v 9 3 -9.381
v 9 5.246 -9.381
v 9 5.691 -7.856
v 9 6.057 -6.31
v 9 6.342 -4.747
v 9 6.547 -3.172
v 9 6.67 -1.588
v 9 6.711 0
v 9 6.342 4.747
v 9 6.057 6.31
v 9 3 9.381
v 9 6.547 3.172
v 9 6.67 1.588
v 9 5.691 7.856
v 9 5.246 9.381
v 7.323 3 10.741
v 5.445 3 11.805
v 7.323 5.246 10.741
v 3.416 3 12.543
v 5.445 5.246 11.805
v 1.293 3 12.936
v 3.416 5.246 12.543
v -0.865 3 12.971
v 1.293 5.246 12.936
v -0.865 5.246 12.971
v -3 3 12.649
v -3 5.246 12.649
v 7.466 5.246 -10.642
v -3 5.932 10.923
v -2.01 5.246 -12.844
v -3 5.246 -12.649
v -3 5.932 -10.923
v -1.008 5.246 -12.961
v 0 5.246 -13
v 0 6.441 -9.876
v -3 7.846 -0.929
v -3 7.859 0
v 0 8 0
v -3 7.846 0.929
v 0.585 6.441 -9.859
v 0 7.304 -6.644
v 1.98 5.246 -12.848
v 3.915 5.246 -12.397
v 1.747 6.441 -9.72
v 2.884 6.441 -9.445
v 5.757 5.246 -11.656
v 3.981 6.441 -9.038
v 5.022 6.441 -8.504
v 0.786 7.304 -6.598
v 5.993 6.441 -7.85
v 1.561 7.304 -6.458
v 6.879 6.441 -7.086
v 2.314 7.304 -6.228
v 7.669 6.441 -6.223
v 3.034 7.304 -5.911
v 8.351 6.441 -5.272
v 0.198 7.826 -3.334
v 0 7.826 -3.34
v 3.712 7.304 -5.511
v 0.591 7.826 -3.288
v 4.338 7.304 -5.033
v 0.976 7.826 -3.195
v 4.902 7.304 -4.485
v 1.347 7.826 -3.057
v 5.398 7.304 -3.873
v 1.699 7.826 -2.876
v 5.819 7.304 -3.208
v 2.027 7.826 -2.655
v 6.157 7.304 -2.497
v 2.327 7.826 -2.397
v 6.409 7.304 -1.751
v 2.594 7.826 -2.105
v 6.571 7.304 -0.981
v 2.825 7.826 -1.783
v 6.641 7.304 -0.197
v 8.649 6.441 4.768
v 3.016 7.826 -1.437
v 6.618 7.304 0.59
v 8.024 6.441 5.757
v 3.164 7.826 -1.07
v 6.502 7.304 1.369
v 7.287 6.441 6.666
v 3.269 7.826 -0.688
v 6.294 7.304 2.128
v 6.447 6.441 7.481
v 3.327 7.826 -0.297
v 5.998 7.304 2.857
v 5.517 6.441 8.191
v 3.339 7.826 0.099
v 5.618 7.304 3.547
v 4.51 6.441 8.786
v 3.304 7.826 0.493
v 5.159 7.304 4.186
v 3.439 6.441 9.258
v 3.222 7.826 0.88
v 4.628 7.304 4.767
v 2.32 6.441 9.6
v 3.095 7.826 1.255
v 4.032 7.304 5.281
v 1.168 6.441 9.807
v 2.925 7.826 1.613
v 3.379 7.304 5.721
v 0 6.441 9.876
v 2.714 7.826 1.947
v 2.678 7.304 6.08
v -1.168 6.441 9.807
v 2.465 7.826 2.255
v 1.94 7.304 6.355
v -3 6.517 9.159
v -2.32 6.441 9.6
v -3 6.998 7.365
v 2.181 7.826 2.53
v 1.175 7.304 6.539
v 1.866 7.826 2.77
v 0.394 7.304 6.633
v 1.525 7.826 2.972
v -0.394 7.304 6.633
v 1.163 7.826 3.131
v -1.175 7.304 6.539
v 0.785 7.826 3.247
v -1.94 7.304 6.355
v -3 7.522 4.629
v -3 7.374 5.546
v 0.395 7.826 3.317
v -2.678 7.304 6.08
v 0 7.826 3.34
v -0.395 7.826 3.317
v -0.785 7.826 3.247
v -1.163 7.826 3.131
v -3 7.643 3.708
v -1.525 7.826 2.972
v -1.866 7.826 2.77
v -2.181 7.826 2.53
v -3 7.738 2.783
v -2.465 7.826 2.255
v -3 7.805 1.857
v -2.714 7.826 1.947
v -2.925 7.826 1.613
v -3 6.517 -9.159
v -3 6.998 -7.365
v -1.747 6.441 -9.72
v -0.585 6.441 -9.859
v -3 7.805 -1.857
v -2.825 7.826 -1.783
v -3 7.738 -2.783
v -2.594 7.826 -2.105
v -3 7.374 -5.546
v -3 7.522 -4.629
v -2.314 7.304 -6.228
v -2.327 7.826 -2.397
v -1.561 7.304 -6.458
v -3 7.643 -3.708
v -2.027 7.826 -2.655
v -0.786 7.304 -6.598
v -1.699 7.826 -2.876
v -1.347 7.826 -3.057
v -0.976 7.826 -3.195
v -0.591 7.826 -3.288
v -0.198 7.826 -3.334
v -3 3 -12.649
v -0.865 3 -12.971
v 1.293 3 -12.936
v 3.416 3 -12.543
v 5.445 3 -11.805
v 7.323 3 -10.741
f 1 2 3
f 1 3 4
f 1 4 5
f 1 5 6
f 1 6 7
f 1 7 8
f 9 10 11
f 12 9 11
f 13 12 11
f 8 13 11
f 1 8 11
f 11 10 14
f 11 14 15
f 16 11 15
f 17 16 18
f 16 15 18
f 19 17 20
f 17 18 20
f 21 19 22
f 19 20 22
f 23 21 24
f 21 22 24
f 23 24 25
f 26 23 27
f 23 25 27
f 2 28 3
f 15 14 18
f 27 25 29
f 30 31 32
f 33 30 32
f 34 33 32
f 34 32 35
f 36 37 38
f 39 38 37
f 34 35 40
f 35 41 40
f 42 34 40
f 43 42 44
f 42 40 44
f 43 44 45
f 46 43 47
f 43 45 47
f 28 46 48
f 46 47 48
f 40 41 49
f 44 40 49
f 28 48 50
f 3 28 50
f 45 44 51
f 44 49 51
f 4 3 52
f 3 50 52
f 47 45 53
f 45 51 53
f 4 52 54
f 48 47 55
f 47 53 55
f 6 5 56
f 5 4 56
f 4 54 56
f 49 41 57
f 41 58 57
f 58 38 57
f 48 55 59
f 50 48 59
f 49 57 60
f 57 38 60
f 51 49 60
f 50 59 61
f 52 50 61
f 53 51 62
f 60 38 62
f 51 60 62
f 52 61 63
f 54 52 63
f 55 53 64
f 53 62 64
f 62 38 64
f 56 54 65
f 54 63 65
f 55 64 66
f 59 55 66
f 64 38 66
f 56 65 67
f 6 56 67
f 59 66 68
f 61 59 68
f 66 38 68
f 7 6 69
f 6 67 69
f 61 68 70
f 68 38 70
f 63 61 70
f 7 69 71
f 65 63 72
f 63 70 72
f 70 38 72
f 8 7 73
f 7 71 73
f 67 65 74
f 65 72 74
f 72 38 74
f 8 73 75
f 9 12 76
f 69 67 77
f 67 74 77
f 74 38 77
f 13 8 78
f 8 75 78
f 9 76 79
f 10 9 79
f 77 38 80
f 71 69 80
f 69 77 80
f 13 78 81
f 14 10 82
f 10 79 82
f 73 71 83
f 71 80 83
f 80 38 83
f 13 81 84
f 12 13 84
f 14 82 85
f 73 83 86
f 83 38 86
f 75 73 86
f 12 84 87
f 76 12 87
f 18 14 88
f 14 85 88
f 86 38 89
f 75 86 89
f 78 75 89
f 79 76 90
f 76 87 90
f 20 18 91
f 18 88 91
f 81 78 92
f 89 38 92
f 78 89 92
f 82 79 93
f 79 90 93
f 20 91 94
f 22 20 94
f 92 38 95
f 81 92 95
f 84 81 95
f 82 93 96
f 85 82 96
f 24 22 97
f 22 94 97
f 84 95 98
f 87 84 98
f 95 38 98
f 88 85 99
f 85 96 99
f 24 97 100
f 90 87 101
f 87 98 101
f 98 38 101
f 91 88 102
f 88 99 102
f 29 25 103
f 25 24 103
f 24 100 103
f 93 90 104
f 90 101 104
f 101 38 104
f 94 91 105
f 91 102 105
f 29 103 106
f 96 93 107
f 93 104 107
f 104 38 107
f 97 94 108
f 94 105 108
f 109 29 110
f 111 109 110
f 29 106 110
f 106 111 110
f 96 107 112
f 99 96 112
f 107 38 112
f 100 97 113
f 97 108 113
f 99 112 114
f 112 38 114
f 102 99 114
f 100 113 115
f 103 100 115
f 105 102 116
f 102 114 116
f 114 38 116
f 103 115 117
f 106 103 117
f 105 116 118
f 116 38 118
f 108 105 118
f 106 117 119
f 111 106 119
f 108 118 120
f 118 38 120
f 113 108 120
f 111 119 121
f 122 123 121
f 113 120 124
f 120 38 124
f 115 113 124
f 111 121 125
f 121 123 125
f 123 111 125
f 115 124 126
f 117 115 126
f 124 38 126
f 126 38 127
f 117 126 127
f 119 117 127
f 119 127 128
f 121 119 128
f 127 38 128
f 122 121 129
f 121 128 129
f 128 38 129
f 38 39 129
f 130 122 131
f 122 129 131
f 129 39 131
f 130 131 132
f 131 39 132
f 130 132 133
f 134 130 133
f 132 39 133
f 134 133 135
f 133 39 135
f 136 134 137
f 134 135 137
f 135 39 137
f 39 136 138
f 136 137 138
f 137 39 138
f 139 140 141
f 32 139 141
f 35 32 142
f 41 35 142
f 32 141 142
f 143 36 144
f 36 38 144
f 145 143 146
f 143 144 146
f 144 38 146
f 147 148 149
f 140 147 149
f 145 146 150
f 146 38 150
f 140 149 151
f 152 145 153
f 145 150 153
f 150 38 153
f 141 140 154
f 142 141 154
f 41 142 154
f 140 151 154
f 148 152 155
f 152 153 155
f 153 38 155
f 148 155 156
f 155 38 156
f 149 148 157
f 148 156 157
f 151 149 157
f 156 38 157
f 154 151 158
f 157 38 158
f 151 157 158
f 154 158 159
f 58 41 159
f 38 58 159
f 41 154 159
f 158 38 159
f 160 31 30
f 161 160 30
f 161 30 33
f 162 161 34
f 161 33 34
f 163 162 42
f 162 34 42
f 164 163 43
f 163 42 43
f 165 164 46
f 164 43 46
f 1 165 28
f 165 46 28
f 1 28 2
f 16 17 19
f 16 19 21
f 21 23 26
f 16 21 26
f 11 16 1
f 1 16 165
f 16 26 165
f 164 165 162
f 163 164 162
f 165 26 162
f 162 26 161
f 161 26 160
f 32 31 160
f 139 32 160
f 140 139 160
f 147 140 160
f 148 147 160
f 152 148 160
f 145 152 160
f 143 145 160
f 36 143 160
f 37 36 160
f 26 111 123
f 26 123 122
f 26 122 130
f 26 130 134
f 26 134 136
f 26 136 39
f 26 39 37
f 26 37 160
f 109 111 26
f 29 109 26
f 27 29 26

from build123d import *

# Parameters (mm, degrees)
SKETCH_2_OUTSIDE_W       = 35.526
SKETCH_2_OUTSIDE_H       = 35.526
SKETCH_2_OUTSIDE_W_2     = 12
SKETCH_2_OUTSIDE_H_2     = 28
CUT_EXTRUDE_1_DEPTH      = 9
SKETCH_3_W               = 30
SKETCH_3_H               = 3
CUT_EXTRUDE_2_DEPTH      = 10
CUT_EXTRUDE_2_DEPTH_BACK = 4


with BuildPart() as part:
    # Эскиз1 → Повернуть1 (revolve)
    with BuildSketch(Plane(origin=(0, 0, 0), x_dir=(0, 0, -1), z_dir=(1, 0, 0))):
        with BuildLine():
            Line((13, 1.217734844), (13, 5.246033508))
            ThreePointArc((13, 5.246033508), (6.644251866, 7.303952511), (0, 8))
            Line((0, 8), (0, 0))
            ThreePointArc((0, 0), (6.528454606, 0.305098605), (13, 1.217734844))
        make_face()
    revolve(axis=Axis((0, 8, 0), (0, -1, 0)))

    # Эскиз2 outside → Вырез-Вытянуть1 (cut, through all)
    with BuildSketch(Plane.XZ.offset(-8)):
        Rectangle(SKETCH_2_OUTSIDE_W, SKETCH_2_OUTSIDE_H)
        with Locations((3, 0)):
            Rectangle(SKETCH_2_OUTSIDE_W_2, SKETCH_2_OUTSIDE_H_2, mode=Mode.SUBTRACT)
    extrude(amount=CUT_EXTRUDE_1_DEPTH, mode=Mode.SUBTRACT)

    # Эскиз3 → Вырез-Вытянуть2 (cut, two sides)
    with BuildSketch(Plane(origin=(0, 0, 0), x_dir=(0, 0, -1), z_dir=(1, 0, 0))) as cut_extrude_2_sk:
        with Locations((0, 1.5)):
            Rectangle(SKETCH_3_W, SKETCH_3_H)
    extrude(amount=CUT_EXTRUDE_2_DEPTH, mode=Mode.SUBTRACT)
    extrude(cut_extrude_2_sk.sketch, amount=-CUT_EXTRUDE_2_DEPTH_BACK, mode=Mode.SUBTRACT)


solid = part.part
